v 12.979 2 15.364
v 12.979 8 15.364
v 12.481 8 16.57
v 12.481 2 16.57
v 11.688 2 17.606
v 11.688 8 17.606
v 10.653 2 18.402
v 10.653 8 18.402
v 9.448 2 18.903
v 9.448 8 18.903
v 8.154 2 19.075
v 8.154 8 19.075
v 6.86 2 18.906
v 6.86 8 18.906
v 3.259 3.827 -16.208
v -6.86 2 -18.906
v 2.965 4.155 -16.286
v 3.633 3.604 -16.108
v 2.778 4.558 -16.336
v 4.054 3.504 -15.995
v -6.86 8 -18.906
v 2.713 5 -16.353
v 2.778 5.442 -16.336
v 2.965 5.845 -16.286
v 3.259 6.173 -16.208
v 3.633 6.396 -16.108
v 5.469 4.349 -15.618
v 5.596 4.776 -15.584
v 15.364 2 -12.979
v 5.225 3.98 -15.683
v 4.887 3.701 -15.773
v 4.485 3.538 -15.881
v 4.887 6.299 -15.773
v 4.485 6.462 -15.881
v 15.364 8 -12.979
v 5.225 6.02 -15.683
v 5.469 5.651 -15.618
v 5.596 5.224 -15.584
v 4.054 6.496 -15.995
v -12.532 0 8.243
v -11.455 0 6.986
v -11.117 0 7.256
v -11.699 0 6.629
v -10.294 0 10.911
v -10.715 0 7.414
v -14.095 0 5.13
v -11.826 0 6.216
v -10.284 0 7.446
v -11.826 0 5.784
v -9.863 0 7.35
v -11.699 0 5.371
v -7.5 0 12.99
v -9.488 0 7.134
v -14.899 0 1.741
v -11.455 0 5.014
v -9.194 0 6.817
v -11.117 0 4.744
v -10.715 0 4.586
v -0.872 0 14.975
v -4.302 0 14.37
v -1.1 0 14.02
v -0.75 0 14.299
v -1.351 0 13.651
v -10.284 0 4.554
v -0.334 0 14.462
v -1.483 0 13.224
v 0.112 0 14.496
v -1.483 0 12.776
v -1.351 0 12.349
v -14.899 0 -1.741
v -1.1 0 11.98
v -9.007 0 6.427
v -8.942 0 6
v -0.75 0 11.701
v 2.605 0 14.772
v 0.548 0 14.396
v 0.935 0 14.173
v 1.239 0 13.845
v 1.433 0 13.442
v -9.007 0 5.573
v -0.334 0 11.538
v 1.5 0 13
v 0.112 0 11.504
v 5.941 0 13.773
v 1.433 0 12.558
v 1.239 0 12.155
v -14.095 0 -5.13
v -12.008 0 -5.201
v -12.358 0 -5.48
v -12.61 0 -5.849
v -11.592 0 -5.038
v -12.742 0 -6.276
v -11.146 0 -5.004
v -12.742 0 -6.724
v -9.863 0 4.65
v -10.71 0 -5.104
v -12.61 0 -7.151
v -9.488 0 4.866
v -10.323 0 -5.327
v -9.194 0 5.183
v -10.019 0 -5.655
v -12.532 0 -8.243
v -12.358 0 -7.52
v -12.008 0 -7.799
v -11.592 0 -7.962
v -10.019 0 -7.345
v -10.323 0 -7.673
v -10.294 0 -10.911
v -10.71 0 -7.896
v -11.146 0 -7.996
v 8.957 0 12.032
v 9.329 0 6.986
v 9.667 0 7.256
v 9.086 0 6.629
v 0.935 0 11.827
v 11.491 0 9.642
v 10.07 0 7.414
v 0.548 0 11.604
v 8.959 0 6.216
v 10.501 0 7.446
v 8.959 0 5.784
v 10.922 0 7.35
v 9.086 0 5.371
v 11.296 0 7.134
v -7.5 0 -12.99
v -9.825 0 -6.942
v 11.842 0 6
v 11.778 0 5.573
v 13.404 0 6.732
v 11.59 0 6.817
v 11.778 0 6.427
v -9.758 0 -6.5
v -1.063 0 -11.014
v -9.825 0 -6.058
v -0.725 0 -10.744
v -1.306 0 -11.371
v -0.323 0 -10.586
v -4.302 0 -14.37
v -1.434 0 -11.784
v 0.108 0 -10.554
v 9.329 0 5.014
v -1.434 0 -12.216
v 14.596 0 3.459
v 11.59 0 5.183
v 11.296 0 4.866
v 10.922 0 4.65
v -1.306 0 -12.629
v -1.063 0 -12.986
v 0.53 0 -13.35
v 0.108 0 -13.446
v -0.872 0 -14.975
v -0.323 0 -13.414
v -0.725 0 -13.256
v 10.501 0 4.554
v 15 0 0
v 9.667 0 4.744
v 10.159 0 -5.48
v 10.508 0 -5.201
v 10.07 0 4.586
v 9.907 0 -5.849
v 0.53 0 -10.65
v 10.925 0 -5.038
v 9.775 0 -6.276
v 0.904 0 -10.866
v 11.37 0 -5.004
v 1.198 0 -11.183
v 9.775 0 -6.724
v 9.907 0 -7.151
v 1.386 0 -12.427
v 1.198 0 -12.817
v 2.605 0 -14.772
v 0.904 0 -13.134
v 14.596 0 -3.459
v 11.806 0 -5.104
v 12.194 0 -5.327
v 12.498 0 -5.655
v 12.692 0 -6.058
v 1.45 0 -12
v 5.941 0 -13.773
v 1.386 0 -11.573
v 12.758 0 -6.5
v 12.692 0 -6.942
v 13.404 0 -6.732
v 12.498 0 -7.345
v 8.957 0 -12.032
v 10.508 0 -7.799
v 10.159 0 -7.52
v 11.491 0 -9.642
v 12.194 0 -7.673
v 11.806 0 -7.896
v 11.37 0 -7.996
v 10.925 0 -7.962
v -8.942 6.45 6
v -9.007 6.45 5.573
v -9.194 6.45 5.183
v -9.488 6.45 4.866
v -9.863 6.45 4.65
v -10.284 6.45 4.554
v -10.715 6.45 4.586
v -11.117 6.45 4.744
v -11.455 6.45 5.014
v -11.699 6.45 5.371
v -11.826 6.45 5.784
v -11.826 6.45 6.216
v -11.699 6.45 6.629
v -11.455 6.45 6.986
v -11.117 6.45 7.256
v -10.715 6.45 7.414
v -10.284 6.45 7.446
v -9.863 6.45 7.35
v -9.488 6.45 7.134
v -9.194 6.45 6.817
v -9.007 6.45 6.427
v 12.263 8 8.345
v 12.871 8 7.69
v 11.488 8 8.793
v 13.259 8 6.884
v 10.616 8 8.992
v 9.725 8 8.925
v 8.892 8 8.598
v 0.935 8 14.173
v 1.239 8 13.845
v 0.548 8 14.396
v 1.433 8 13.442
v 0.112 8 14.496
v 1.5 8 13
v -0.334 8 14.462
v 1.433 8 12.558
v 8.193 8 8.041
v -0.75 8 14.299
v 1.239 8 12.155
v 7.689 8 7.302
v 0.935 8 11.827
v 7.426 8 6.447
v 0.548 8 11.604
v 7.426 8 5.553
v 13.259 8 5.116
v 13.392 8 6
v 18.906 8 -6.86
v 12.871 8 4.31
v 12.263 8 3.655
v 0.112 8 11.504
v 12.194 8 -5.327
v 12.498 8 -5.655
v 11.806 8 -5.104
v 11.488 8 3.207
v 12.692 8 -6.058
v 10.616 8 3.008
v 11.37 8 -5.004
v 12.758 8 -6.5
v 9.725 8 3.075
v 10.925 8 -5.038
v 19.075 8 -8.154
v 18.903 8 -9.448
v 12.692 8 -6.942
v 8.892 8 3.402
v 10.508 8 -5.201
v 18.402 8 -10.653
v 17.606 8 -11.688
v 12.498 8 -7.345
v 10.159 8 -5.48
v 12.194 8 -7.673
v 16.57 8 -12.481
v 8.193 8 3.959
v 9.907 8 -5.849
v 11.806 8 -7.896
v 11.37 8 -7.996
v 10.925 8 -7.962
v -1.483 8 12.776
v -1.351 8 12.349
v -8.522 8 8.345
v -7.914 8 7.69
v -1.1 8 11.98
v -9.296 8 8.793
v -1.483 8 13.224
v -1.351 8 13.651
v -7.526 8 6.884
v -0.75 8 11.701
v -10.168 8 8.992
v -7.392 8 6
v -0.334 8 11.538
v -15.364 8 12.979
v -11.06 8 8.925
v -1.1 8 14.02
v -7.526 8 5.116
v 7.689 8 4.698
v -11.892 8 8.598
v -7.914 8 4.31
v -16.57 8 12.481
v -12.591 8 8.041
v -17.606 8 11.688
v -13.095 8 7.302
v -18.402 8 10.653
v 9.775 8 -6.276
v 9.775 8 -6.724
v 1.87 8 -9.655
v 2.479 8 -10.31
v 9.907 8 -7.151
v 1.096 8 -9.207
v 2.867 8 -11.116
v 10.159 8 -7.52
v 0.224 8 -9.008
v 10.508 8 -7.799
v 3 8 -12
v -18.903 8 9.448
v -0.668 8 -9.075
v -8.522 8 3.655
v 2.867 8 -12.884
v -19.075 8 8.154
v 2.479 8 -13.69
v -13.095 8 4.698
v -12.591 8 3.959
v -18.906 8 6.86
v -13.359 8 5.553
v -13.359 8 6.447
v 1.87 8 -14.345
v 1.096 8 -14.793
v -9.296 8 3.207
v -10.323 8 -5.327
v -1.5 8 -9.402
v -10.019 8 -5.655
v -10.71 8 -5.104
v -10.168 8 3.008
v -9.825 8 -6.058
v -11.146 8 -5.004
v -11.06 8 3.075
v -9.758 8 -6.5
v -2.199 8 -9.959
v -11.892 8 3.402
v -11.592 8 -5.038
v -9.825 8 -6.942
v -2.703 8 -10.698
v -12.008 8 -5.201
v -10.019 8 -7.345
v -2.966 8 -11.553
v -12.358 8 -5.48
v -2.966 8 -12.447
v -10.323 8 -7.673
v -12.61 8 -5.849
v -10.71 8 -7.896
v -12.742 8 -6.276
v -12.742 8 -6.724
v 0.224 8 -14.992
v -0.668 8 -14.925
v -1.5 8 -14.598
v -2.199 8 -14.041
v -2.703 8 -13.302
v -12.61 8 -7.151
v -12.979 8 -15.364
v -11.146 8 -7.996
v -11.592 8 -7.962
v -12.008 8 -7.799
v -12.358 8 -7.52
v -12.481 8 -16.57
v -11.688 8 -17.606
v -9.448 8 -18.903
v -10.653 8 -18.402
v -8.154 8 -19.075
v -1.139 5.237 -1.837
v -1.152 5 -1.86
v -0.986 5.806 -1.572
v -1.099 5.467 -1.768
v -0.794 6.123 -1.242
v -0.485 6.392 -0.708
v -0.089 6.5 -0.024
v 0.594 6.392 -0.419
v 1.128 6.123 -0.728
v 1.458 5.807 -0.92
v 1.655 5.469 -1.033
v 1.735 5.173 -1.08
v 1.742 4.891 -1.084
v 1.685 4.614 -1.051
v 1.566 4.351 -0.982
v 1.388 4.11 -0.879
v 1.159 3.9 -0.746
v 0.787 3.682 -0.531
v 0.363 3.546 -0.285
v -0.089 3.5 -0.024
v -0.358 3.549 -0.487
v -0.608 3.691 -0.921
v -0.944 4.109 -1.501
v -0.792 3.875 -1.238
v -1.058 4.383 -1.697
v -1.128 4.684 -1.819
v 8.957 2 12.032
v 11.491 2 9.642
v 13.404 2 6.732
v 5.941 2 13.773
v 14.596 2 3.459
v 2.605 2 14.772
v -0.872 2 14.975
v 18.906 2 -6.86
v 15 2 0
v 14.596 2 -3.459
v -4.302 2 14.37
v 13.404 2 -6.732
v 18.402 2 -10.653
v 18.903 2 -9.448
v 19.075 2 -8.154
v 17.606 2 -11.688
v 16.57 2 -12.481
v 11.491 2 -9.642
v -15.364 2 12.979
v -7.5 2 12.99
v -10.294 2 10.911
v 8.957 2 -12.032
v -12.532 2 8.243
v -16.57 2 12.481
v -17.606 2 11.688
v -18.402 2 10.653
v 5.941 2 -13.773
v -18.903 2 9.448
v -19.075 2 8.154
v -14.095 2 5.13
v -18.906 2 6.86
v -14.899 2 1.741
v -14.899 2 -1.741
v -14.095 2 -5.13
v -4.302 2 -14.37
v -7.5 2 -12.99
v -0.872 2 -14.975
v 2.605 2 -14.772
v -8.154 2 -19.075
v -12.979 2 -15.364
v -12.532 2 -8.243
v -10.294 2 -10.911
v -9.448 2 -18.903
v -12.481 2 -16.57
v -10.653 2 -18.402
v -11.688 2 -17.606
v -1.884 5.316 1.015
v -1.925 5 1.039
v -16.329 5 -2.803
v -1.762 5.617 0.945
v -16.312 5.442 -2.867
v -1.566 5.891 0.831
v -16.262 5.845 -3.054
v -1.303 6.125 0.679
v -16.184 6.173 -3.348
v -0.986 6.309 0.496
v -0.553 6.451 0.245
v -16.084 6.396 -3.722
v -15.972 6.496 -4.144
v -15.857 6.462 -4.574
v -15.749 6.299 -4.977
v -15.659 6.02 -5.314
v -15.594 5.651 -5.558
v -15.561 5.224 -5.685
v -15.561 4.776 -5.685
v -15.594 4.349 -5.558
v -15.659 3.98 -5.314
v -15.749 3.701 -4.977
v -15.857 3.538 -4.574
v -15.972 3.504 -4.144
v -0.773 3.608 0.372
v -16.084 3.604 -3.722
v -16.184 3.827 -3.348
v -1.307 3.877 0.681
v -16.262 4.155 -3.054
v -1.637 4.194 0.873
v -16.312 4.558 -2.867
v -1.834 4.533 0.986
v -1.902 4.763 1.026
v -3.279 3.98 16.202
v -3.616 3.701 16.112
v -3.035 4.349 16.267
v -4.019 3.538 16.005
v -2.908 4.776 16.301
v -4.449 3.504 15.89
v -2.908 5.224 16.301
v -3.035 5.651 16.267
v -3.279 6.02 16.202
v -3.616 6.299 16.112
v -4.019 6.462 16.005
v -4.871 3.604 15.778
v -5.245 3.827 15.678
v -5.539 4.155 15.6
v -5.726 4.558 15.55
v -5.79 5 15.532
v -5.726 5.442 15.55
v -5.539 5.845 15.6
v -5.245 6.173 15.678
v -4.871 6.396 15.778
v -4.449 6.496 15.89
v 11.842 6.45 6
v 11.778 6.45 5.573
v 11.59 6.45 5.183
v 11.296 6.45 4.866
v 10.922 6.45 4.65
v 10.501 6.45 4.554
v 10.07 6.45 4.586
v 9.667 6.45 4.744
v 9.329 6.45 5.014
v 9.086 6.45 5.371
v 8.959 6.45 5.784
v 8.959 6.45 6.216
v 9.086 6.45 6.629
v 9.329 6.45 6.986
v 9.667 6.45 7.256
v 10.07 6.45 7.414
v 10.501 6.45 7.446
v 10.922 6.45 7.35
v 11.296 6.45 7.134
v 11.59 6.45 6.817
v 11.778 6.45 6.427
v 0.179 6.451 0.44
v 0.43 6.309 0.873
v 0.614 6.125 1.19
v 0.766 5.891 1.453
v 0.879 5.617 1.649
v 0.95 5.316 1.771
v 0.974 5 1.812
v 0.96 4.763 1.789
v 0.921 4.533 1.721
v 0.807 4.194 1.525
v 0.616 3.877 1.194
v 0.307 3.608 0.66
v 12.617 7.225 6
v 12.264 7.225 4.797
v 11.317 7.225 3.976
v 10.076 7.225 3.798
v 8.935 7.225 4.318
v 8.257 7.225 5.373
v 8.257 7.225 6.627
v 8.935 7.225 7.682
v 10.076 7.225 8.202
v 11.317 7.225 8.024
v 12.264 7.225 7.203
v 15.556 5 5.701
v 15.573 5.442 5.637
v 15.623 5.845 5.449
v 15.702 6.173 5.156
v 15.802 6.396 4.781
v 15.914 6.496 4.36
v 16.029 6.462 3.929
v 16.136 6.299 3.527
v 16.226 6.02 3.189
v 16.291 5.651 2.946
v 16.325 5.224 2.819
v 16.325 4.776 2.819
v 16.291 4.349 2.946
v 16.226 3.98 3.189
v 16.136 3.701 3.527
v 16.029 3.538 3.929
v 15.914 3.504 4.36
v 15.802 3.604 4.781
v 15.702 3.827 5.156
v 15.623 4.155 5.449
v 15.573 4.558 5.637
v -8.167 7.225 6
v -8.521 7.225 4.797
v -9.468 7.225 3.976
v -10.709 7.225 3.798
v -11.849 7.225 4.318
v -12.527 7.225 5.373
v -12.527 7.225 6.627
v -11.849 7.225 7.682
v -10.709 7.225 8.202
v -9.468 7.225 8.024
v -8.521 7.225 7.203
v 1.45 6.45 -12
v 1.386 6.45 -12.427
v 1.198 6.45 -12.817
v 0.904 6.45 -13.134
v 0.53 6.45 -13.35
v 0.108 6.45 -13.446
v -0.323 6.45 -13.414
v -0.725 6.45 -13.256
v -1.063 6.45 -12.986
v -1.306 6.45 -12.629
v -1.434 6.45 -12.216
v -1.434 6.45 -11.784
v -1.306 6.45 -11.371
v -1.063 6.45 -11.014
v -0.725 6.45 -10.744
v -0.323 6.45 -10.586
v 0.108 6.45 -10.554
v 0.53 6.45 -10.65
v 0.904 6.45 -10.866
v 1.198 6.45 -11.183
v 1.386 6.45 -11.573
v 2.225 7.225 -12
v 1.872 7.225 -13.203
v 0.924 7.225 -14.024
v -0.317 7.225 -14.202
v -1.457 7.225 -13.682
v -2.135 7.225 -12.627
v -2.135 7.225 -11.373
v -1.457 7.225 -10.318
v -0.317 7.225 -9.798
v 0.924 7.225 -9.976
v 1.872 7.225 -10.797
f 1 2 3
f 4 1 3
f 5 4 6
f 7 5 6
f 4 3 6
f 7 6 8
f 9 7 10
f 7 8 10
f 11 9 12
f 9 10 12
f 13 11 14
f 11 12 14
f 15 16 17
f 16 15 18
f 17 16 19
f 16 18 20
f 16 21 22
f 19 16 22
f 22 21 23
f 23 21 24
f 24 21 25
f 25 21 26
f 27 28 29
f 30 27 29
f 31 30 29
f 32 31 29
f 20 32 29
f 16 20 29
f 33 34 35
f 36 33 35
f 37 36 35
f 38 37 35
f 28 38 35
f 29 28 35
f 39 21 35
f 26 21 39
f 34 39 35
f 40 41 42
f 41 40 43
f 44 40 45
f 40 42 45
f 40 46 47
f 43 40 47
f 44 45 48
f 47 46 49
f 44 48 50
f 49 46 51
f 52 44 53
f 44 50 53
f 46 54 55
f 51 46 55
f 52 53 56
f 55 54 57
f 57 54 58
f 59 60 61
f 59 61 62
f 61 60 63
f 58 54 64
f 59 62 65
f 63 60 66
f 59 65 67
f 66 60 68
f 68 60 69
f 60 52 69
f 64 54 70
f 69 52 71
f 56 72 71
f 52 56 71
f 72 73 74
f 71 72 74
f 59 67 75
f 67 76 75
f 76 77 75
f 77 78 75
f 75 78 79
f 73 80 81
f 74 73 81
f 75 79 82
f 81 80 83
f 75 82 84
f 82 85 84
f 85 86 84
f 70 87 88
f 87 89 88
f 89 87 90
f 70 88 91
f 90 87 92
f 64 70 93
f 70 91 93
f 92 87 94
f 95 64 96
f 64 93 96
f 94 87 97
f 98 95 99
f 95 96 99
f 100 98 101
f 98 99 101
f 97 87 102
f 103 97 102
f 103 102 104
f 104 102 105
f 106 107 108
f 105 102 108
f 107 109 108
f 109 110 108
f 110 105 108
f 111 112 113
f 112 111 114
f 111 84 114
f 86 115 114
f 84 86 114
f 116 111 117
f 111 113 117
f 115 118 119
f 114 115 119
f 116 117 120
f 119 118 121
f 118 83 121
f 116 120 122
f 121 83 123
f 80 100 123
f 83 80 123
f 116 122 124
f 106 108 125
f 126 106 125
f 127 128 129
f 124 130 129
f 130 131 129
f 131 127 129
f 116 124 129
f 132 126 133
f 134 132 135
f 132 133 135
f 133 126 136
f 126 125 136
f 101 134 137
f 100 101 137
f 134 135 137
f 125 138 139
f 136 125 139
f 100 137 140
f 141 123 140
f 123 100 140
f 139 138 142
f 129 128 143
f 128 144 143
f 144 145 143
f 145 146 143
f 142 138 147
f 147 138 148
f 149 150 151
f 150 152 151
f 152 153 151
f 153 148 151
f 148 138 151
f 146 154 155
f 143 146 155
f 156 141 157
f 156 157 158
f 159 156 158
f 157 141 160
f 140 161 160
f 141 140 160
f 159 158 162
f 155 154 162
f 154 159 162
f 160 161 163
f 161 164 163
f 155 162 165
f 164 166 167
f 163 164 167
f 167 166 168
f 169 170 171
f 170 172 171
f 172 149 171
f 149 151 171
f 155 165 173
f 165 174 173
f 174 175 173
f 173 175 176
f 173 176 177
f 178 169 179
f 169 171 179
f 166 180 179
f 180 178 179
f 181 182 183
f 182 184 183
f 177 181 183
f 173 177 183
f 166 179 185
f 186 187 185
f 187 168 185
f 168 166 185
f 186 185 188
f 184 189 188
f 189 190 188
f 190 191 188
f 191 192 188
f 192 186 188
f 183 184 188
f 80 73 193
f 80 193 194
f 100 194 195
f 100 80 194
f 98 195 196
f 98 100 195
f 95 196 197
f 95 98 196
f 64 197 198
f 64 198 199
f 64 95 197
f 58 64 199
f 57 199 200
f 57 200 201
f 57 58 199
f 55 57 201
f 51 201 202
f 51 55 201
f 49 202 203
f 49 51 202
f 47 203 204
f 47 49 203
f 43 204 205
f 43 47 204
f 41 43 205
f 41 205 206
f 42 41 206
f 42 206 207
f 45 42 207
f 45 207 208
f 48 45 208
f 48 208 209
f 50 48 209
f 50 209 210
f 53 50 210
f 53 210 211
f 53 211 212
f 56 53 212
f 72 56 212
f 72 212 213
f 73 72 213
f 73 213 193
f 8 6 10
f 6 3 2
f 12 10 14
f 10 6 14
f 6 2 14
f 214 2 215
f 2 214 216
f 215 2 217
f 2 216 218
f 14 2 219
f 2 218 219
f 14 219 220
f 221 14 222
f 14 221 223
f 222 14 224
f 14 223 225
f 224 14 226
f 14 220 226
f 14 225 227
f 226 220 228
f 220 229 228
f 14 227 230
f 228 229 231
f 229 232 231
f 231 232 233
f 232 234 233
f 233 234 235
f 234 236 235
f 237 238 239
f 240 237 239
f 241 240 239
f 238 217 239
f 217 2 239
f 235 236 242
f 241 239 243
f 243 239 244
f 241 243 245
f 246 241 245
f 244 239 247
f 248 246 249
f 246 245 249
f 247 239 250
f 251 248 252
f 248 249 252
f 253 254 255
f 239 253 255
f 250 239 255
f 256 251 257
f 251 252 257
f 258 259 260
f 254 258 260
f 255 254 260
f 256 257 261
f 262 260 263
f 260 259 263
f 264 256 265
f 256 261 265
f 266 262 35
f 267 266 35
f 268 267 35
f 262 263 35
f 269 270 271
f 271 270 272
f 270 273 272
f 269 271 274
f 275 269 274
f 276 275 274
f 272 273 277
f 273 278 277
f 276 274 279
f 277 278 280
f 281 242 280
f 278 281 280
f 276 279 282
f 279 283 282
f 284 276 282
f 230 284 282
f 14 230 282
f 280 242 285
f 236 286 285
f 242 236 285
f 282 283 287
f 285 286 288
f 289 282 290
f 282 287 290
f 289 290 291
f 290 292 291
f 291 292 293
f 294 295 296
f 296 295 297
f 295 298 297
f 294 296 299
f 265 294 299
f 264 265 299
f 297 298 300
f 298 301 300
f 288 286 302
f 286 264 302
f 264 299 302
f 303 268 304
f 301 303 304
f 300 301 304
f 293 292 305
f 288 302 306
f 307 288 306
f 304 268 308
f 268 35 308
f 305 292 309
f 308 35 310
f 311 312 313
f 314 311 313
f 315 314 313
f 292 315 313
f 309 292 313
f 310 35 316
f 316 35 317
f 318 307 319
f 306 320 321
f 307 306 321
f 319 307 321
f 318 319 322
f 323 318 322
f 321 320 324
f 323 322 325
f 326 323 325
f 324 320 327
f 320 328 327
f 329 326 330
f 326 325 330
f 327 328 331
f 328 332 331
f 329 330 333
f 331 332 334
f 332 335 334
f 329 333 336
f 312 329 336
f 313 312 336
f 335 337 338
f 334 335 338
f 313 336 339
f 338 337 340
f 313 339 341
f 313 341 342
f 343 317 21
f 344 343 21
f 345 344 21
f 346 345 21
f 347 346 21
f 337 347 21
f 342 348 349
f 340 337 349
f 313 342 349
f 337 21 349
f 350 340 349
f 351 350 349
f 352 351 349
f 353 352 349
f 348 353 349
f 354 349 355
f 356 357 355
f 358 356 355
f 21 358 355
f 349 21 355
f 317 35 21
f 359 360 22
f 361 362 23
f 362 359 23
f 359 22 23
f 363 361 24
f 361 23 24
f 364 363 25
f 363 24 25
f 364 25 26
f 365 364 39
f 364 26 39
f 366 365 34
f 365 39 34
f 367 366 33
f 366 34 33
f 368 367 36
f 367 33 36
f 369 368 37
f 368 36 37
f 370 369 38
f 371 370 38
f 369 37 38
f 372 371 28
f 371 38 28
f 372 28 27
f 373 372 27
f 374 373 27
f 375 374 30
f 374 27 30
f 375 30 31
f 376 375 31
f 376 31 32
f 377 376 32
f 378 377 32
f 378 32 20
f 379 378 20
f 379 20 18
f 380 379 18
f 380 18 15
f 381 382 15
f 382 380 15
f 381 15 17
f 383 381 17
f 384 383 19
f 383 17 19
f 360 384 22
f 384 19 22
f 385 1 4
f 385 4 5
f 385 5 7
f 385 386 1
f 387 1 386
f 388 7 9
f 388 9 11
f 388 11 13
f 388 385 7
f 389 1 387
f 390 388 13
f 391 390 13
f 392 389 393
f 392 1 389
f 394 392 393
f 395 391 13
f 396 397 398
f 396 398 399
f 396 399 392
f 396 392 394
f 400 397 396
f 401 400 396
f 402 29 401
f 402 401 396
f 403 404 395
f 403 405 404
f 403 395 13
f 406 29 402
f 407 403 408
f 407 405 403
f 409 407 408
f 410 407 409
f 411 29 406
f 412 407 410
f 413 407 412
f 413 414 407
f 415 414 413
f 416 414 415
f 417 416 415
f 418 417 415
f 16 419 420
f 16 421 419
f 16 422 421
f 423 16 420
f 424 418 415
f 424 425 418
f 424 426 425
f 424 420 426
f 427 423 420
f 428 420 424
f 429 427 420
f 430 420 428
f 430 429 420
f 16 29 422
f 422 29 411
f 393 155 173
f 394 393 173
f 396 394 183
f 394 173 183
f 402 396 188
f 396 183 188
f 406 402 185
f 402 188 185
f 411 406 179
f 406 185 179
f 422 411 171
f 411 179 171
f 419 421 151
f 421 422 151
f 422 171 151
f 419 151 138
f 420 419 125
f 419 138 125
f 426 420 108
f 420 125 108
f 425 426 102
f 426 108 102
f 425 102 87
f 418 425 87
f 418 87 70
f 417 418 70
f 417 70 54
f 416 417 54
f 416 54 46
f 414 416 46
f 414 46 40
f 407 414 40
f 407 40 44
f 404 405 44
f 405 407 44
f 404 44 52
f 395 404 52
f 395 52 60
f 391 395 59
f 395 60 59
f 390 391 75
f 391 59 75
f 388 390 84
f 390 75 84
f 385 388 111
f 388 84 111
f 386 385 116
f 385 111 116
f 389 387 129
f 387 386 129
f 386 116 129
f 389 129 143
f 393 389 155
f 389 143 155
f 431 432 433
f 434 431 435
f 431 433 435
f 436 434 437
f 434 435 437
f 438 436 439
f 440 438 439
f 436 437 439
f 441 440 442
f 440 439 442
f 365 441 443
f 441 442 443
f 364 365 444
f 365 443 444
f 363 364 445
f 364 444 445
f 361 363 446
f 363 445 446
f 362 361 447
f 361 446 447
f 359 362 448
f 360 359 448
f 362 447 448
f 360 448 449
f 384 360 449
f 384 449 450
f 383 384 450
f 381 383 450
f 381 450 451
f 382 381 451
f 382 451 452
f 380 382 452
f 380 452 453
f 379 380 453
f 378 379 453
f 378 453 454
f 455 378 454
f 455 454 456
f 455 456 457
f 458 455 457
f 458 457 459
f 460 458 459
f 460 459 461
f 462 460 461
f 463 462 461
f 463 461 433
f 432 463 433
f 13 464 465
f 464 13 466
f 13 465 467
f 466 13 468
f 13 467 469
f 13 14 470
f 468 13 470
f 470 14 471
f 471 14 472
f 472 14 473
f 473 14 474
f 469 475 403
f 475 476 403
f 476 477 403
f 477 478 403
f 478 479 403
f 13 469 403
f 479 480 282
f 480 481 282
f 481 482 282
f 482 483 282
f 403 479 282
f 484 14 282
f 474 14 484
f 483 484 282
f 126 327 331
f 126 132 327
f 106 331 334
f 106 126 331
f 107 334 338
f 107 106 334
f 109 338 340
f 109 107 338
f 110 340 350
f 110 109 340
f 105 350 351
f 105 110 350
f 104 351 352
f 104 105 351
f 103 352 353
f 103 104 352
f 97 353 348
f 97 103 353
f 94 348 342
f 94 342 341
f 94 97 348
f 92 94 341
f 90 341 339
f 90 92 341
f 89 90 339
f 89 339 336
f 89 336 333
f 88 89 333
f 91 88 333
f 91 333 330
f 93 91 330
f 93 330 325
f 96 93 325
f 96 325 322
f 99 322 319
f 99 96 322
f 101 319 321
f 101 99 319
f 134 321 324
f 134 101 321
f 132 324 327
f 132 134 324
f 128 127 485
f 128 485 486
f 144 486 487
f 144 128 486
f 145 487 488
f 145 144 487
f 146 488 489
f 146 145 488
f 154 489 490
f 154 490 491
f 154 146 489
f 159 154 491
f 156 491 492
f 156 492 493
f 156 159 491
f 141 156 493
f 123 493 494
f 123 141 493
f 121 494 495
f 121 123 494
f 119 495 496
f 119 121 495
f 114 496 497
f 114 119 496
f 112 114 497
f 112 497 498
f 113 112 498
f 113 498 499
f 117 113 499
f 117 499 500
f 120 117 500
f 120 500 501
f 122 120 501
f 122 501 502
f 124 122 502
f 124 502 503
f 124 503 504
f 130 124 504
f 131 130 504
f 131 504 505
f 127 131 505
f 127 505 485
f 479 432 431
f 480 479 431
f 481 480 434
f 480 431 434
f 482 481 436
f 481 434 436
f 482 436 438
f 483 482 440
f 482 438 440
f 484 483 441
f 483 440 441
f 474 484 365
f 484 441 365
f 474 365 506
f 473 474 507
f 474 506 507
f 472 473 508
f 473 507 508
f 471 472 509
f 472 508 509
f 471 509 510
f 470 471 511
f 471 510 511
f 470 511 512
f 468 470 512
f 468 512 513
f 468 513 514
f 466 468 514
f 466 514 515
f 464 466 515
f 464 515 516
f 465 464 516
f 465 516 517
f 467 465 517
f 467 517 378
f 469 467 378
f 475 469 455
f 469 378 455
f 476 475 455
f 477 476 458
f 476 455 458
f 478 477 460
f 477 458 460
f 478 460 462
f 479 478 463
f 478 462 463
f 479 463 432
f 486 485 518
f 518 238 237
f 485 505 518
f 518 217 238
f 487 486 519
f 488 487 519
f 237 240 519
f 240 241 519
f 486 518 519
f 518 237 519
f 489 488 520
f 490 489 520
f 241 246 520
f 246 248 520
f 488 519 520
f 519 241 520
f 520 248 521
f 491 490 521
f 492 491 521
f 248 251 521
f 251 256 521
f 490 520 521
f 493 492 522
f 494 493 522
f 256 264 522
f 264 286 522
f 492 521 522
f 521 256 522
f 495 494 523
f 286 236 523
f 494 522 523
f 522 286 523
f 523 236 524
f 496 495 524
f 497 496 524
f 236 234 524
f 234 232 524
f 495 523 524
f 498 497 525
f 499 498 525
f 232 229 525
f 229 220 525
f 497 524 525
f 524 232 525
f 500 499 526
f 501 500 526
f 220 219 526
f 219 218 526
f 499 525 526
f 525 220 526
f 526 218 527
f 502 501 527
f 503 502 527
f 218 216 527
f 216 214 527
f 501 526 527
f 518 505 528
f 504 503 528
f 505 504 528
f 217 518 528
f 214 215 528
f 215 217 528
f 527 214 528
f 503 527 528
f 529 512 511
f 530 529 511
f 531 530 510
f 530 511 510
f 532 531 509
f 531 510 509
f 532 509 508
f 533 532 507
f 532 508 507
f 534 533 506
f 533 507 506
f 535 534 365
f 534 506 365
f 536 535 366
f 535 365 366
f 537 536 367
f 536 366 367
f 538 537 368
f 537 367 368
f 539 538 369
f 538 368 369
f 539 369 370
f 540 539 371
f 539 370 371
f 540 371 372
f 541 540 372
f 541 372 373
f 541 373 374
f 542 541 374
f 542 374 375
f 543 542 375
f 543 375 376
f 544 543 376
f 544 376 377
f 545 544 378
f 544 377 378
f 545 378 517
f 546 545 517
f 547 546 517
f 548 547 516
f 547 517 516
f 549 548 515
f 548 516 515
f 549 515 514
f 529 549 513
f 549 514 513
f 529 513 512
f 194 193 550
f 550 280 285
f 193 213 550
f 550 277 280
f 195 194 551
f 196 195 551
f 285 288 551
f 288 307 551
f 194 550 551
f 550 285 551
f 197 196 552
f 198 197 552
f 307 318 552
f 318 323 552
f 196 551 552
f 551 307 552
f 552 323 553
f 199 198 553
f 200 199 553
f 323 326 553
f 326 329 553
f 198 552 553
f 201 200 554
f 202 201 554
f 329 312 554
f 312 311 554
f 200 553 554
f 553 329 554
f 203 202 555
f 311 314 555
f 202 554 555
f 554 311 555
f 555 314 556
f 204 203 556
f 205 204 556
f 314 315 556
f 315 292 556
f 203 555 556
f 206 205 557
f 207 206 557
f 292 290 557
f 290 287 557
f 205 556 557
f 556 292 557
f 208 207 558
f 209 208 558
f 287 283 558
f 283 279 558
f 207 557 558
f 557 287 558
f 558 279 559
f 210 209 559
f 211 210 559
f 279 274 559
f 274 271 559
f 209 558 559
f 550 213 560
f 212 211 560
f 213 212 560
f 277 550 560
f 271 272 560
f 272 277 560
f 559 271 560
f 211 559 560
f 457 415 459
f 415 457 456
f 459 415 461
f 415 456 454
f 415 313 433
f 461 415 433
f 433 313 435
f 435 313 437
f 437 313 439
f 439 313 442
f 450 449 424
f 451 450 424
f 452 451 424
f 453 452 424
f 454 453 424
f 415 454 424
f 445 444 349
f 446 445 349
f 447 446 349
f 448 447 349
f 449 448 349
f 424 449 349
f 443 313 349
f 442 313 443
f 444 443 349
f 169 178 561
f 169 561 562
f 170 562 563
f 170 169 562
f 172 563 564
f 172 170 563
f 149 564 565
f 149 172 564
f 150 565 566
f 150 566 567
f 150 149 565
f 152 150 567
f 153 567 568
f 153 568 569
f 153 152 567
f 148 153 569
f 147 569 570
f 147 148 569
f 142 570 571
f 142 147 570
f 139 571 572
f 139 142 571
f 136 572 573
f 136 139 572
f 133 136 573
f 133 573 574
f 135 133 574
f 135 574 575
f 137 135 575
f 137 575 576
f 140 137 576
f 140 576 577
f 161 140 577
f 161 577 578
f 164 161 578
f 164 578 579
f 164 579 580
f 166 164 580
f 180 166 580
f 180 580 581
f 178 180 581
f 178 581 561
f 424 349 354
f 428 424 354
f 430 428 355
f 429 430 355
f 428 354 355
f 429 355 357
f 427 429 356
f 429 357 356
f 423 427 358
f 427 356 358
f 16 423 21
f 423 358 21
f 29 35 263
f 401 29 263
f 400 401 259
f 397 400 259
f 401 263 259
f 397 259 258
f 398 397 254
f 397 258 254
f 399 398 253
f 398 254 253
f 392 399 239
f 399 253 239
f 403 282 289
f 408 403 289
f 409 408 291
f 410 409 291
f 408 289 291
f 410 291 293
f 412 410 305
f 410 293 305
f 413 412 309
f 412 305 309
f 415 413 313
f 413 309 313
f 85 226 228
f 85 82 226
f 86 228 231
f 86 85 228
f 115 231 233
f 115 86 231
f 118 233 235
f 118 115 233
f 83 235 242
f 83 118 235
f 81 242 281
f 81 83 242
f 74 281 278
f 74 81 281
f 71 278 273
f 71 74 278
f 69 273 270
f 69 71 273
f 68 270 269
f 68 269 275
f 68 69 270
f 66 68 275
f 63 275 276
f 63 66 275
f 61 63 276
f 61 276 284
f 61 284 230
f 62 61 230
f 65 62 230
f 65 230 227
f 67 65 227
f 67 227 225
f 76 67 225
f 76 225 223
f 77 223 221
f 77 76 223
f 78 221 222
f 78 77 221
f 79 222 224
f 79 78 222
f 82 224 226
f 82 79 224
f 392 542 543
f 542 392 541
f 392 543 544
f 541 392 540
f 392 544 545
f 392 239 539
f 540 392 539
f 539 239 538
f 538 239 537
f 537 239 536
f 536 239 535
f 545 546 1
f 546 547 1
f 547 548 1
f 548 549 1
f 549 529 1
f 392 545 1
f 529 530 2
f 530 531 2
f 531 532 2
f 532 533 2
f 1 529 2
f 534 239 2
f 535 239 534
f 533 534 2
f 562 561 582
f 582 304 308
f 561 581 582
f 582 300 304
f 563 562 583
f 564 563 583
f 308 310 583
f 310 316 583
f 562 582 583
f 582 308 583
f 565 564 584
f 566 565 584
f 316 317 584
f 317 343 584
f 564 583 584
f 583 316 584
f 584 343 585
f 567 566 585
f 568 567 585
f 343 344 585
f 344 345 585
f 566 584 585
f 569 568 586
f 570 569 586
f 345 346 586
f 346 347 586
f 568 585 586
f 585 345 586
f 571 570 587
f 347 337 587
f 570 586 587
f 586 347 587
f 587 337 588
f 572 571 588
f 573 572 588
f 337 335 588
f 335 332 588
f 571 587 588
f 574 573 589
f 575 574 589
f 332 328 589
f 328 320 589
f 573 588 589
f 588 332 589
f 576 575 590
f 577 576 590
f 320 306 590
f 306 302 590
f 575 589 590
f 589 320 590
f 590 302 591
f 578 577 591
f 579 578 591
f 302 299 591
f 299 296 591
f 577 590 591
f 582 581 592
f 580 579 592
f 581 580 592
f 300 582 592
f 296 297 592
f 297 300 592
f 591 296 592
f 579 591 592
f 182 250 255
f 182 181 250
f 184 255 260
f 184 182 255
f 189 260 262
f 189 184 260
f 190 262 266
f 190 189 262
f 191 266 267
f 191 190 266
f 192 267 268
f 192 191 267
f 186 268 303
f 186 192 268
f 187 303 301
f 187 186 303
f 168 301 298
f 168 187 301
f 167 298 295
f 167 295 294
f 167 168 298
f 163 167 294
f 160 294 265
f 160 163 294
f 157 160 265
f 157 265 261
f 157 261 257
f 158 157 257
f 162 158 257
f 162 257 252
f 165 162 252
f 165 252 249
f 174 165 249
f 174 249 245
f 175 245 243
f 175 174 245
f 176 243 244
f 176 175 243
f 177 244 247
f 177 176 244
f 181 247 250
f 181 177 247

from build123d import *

# Parameters (mm, degrees)
SKETCH_1_R          = 15
SKETCH_1_R_2        = 1.45
SKETCH_1_R_3        = 1.5
EXTRUDE_1_DEPTH     = 8
SKETCH_2_R          = 1.45
SKETCH_2_R_2        = 1.5
EXTRUDE_2_DEPTH     = 6
CHAMFER_1_SIZE      = 1.55
SKETCH_3_R          = 1.5
CUT_EXTRUDE_1_DEPTH = 40.846349976
SKETCH_4_R          = 1.5
CUT_EXTRUDE_2_DEPTH = 40.846349976


with BuildPart() as part:
    # 草图1 → 凸台-拉伸1 (new body)
    with BuildSketch(Plane(origin=(0, 0, 0), x_dir=(1, 0, 0), z_dir=(0, 1, 0))):
        Circle(SKETCH_1_R)
        with Locations((0, 12)):
            Circle(SKETCH_1_R_2, mode=Mode.SUBTRACT)
        with Locations((-10.392304845, -6)):
            Circle(SKETCH_1_R_2, mode=Mode.SUBTRACT)
        with Locations((10.392304845, -6)):
            Circle(SKETCH_1_R_2, mode=Mode.SUBTRACT)
        with Locations((-11.258330249, 6.5)):
            Circle(SKETCH_1_R_3, mode=Mode.SUBTRACT)
        with Locations((0, -13)):
            Circle(SKETCH_1_R_3, mode=Mode.SUBTRACT)
        with Locations((11.258330249, 6.5)):
            Circle(SKETCH_1_R_3, mode=Mode.SUBTRACT)
    extrude(amount=EXTRUDE_1_DEPTH)

    # 草图2 → 凸台-拉伸2 (add)
    with BuildSketch(Plane(origin=(0, 8, 0), x_dir=(1, 0, 0), z_dir=(0, 1, 0))):
        with BuildLine():
            Line((-6.859687774, 18.906207542), (15.363533928, 12.979284466))
            ThreePointArc((15.363533928, 12.979284466), (18.402280708, 10.653197849), (18.906207542, 6.859687774))
            Line((18.906207542, 6.859687774), (12.979284466, -15.363533928))
            ThreePointArc((12.979284466, -15.363533928), (10.653197849, -18.402280708), (6.859687774, -18.906207542))
            Line((6.859687774, -18.906207542), (-15.363533928, -12.979284466))
            ThreePointArc((-15.363533928, -12.979284466), (-18.402280708, -10.653197849), (-18.906207542, -6.859687774))
            Line((-18.906207542, -6.859687774), (-12.979284466, 15.363533928))
            ThreePointArc((-12.979284466, 15.363533928), (-10.653197849, 18.402280708), (-6.859687774, 18.906207542))
        make_face()
        with Locations((0, 12)):
            Circle(SKETCH_2_R, mode=Mode.SUBTRACT)
        with Locations((-11.258330249, 6.5)):
            Circle(SKETCH_2_R_2, mode=Mode.SUBTRACT)
        with Locations((11.258330249, 6.5)):
            Circle(SKETCH_2_R_2, mode=Mode.SUBTRACT)
        with Locations((-10.392304845, -6)):
            Circle(SKETCH_2_R, mode=Mode.SUBTRACT)
        with Locations((0, -13)):
            Circle(SKETCH_2_R_2, mode=Mode.SUBTRACT)
        with Locations((10.392304845, -6)):
            Circle(SKETCH_2_R, mode=Mode.SUBTRACT)
    extrude(amount=-EXTRUDE_2_DEPTH)

    # 倒角1
    chamfer_1_edges = [part.edges().sort_by_distance(p)[0] for p in [
        (8.942304845, 8, 6),
        (-1.45, 8, -12),
        (-11.842304845, 8, 6),
    ]]
    chamfer(chamfer_1_edges, length=CHAMFER_1_SIZE)

    # 草图3 → 切除-拉伸1 (cut, through all)
    with BuildSketch(Plane(origin=(-15.942746004, 0, -4.251923077), x_dir=(-0.257692308, 0, 0.966227031), z_dir=(-0.966227031, 0, -0.257692308))):
        with Locations((0, 5)):
            Circle(SKETCH_3_R)
    extrude(amount=-CUT_EXTRUDE_1_DEPTH, mode=Mode.SUBTRACT)

    # 草图4 → 切除-拉伸2 (cut, through all)
    with BuildSketch(Plane(origin=(4.251923077, 0, -15.942746004), x_dir=(-0.966227031, 0, -0.257692308), z_dir=(0.257692308, 0, -0.966227031))):
        with Locations((0.092307692, 5)):
            Circle(SKETCH_4_R)
    extrude(amount=-CUT_EXTRUDE_2_DEPTH, mode=Mode.SUBTRACT)


solid = part.part
